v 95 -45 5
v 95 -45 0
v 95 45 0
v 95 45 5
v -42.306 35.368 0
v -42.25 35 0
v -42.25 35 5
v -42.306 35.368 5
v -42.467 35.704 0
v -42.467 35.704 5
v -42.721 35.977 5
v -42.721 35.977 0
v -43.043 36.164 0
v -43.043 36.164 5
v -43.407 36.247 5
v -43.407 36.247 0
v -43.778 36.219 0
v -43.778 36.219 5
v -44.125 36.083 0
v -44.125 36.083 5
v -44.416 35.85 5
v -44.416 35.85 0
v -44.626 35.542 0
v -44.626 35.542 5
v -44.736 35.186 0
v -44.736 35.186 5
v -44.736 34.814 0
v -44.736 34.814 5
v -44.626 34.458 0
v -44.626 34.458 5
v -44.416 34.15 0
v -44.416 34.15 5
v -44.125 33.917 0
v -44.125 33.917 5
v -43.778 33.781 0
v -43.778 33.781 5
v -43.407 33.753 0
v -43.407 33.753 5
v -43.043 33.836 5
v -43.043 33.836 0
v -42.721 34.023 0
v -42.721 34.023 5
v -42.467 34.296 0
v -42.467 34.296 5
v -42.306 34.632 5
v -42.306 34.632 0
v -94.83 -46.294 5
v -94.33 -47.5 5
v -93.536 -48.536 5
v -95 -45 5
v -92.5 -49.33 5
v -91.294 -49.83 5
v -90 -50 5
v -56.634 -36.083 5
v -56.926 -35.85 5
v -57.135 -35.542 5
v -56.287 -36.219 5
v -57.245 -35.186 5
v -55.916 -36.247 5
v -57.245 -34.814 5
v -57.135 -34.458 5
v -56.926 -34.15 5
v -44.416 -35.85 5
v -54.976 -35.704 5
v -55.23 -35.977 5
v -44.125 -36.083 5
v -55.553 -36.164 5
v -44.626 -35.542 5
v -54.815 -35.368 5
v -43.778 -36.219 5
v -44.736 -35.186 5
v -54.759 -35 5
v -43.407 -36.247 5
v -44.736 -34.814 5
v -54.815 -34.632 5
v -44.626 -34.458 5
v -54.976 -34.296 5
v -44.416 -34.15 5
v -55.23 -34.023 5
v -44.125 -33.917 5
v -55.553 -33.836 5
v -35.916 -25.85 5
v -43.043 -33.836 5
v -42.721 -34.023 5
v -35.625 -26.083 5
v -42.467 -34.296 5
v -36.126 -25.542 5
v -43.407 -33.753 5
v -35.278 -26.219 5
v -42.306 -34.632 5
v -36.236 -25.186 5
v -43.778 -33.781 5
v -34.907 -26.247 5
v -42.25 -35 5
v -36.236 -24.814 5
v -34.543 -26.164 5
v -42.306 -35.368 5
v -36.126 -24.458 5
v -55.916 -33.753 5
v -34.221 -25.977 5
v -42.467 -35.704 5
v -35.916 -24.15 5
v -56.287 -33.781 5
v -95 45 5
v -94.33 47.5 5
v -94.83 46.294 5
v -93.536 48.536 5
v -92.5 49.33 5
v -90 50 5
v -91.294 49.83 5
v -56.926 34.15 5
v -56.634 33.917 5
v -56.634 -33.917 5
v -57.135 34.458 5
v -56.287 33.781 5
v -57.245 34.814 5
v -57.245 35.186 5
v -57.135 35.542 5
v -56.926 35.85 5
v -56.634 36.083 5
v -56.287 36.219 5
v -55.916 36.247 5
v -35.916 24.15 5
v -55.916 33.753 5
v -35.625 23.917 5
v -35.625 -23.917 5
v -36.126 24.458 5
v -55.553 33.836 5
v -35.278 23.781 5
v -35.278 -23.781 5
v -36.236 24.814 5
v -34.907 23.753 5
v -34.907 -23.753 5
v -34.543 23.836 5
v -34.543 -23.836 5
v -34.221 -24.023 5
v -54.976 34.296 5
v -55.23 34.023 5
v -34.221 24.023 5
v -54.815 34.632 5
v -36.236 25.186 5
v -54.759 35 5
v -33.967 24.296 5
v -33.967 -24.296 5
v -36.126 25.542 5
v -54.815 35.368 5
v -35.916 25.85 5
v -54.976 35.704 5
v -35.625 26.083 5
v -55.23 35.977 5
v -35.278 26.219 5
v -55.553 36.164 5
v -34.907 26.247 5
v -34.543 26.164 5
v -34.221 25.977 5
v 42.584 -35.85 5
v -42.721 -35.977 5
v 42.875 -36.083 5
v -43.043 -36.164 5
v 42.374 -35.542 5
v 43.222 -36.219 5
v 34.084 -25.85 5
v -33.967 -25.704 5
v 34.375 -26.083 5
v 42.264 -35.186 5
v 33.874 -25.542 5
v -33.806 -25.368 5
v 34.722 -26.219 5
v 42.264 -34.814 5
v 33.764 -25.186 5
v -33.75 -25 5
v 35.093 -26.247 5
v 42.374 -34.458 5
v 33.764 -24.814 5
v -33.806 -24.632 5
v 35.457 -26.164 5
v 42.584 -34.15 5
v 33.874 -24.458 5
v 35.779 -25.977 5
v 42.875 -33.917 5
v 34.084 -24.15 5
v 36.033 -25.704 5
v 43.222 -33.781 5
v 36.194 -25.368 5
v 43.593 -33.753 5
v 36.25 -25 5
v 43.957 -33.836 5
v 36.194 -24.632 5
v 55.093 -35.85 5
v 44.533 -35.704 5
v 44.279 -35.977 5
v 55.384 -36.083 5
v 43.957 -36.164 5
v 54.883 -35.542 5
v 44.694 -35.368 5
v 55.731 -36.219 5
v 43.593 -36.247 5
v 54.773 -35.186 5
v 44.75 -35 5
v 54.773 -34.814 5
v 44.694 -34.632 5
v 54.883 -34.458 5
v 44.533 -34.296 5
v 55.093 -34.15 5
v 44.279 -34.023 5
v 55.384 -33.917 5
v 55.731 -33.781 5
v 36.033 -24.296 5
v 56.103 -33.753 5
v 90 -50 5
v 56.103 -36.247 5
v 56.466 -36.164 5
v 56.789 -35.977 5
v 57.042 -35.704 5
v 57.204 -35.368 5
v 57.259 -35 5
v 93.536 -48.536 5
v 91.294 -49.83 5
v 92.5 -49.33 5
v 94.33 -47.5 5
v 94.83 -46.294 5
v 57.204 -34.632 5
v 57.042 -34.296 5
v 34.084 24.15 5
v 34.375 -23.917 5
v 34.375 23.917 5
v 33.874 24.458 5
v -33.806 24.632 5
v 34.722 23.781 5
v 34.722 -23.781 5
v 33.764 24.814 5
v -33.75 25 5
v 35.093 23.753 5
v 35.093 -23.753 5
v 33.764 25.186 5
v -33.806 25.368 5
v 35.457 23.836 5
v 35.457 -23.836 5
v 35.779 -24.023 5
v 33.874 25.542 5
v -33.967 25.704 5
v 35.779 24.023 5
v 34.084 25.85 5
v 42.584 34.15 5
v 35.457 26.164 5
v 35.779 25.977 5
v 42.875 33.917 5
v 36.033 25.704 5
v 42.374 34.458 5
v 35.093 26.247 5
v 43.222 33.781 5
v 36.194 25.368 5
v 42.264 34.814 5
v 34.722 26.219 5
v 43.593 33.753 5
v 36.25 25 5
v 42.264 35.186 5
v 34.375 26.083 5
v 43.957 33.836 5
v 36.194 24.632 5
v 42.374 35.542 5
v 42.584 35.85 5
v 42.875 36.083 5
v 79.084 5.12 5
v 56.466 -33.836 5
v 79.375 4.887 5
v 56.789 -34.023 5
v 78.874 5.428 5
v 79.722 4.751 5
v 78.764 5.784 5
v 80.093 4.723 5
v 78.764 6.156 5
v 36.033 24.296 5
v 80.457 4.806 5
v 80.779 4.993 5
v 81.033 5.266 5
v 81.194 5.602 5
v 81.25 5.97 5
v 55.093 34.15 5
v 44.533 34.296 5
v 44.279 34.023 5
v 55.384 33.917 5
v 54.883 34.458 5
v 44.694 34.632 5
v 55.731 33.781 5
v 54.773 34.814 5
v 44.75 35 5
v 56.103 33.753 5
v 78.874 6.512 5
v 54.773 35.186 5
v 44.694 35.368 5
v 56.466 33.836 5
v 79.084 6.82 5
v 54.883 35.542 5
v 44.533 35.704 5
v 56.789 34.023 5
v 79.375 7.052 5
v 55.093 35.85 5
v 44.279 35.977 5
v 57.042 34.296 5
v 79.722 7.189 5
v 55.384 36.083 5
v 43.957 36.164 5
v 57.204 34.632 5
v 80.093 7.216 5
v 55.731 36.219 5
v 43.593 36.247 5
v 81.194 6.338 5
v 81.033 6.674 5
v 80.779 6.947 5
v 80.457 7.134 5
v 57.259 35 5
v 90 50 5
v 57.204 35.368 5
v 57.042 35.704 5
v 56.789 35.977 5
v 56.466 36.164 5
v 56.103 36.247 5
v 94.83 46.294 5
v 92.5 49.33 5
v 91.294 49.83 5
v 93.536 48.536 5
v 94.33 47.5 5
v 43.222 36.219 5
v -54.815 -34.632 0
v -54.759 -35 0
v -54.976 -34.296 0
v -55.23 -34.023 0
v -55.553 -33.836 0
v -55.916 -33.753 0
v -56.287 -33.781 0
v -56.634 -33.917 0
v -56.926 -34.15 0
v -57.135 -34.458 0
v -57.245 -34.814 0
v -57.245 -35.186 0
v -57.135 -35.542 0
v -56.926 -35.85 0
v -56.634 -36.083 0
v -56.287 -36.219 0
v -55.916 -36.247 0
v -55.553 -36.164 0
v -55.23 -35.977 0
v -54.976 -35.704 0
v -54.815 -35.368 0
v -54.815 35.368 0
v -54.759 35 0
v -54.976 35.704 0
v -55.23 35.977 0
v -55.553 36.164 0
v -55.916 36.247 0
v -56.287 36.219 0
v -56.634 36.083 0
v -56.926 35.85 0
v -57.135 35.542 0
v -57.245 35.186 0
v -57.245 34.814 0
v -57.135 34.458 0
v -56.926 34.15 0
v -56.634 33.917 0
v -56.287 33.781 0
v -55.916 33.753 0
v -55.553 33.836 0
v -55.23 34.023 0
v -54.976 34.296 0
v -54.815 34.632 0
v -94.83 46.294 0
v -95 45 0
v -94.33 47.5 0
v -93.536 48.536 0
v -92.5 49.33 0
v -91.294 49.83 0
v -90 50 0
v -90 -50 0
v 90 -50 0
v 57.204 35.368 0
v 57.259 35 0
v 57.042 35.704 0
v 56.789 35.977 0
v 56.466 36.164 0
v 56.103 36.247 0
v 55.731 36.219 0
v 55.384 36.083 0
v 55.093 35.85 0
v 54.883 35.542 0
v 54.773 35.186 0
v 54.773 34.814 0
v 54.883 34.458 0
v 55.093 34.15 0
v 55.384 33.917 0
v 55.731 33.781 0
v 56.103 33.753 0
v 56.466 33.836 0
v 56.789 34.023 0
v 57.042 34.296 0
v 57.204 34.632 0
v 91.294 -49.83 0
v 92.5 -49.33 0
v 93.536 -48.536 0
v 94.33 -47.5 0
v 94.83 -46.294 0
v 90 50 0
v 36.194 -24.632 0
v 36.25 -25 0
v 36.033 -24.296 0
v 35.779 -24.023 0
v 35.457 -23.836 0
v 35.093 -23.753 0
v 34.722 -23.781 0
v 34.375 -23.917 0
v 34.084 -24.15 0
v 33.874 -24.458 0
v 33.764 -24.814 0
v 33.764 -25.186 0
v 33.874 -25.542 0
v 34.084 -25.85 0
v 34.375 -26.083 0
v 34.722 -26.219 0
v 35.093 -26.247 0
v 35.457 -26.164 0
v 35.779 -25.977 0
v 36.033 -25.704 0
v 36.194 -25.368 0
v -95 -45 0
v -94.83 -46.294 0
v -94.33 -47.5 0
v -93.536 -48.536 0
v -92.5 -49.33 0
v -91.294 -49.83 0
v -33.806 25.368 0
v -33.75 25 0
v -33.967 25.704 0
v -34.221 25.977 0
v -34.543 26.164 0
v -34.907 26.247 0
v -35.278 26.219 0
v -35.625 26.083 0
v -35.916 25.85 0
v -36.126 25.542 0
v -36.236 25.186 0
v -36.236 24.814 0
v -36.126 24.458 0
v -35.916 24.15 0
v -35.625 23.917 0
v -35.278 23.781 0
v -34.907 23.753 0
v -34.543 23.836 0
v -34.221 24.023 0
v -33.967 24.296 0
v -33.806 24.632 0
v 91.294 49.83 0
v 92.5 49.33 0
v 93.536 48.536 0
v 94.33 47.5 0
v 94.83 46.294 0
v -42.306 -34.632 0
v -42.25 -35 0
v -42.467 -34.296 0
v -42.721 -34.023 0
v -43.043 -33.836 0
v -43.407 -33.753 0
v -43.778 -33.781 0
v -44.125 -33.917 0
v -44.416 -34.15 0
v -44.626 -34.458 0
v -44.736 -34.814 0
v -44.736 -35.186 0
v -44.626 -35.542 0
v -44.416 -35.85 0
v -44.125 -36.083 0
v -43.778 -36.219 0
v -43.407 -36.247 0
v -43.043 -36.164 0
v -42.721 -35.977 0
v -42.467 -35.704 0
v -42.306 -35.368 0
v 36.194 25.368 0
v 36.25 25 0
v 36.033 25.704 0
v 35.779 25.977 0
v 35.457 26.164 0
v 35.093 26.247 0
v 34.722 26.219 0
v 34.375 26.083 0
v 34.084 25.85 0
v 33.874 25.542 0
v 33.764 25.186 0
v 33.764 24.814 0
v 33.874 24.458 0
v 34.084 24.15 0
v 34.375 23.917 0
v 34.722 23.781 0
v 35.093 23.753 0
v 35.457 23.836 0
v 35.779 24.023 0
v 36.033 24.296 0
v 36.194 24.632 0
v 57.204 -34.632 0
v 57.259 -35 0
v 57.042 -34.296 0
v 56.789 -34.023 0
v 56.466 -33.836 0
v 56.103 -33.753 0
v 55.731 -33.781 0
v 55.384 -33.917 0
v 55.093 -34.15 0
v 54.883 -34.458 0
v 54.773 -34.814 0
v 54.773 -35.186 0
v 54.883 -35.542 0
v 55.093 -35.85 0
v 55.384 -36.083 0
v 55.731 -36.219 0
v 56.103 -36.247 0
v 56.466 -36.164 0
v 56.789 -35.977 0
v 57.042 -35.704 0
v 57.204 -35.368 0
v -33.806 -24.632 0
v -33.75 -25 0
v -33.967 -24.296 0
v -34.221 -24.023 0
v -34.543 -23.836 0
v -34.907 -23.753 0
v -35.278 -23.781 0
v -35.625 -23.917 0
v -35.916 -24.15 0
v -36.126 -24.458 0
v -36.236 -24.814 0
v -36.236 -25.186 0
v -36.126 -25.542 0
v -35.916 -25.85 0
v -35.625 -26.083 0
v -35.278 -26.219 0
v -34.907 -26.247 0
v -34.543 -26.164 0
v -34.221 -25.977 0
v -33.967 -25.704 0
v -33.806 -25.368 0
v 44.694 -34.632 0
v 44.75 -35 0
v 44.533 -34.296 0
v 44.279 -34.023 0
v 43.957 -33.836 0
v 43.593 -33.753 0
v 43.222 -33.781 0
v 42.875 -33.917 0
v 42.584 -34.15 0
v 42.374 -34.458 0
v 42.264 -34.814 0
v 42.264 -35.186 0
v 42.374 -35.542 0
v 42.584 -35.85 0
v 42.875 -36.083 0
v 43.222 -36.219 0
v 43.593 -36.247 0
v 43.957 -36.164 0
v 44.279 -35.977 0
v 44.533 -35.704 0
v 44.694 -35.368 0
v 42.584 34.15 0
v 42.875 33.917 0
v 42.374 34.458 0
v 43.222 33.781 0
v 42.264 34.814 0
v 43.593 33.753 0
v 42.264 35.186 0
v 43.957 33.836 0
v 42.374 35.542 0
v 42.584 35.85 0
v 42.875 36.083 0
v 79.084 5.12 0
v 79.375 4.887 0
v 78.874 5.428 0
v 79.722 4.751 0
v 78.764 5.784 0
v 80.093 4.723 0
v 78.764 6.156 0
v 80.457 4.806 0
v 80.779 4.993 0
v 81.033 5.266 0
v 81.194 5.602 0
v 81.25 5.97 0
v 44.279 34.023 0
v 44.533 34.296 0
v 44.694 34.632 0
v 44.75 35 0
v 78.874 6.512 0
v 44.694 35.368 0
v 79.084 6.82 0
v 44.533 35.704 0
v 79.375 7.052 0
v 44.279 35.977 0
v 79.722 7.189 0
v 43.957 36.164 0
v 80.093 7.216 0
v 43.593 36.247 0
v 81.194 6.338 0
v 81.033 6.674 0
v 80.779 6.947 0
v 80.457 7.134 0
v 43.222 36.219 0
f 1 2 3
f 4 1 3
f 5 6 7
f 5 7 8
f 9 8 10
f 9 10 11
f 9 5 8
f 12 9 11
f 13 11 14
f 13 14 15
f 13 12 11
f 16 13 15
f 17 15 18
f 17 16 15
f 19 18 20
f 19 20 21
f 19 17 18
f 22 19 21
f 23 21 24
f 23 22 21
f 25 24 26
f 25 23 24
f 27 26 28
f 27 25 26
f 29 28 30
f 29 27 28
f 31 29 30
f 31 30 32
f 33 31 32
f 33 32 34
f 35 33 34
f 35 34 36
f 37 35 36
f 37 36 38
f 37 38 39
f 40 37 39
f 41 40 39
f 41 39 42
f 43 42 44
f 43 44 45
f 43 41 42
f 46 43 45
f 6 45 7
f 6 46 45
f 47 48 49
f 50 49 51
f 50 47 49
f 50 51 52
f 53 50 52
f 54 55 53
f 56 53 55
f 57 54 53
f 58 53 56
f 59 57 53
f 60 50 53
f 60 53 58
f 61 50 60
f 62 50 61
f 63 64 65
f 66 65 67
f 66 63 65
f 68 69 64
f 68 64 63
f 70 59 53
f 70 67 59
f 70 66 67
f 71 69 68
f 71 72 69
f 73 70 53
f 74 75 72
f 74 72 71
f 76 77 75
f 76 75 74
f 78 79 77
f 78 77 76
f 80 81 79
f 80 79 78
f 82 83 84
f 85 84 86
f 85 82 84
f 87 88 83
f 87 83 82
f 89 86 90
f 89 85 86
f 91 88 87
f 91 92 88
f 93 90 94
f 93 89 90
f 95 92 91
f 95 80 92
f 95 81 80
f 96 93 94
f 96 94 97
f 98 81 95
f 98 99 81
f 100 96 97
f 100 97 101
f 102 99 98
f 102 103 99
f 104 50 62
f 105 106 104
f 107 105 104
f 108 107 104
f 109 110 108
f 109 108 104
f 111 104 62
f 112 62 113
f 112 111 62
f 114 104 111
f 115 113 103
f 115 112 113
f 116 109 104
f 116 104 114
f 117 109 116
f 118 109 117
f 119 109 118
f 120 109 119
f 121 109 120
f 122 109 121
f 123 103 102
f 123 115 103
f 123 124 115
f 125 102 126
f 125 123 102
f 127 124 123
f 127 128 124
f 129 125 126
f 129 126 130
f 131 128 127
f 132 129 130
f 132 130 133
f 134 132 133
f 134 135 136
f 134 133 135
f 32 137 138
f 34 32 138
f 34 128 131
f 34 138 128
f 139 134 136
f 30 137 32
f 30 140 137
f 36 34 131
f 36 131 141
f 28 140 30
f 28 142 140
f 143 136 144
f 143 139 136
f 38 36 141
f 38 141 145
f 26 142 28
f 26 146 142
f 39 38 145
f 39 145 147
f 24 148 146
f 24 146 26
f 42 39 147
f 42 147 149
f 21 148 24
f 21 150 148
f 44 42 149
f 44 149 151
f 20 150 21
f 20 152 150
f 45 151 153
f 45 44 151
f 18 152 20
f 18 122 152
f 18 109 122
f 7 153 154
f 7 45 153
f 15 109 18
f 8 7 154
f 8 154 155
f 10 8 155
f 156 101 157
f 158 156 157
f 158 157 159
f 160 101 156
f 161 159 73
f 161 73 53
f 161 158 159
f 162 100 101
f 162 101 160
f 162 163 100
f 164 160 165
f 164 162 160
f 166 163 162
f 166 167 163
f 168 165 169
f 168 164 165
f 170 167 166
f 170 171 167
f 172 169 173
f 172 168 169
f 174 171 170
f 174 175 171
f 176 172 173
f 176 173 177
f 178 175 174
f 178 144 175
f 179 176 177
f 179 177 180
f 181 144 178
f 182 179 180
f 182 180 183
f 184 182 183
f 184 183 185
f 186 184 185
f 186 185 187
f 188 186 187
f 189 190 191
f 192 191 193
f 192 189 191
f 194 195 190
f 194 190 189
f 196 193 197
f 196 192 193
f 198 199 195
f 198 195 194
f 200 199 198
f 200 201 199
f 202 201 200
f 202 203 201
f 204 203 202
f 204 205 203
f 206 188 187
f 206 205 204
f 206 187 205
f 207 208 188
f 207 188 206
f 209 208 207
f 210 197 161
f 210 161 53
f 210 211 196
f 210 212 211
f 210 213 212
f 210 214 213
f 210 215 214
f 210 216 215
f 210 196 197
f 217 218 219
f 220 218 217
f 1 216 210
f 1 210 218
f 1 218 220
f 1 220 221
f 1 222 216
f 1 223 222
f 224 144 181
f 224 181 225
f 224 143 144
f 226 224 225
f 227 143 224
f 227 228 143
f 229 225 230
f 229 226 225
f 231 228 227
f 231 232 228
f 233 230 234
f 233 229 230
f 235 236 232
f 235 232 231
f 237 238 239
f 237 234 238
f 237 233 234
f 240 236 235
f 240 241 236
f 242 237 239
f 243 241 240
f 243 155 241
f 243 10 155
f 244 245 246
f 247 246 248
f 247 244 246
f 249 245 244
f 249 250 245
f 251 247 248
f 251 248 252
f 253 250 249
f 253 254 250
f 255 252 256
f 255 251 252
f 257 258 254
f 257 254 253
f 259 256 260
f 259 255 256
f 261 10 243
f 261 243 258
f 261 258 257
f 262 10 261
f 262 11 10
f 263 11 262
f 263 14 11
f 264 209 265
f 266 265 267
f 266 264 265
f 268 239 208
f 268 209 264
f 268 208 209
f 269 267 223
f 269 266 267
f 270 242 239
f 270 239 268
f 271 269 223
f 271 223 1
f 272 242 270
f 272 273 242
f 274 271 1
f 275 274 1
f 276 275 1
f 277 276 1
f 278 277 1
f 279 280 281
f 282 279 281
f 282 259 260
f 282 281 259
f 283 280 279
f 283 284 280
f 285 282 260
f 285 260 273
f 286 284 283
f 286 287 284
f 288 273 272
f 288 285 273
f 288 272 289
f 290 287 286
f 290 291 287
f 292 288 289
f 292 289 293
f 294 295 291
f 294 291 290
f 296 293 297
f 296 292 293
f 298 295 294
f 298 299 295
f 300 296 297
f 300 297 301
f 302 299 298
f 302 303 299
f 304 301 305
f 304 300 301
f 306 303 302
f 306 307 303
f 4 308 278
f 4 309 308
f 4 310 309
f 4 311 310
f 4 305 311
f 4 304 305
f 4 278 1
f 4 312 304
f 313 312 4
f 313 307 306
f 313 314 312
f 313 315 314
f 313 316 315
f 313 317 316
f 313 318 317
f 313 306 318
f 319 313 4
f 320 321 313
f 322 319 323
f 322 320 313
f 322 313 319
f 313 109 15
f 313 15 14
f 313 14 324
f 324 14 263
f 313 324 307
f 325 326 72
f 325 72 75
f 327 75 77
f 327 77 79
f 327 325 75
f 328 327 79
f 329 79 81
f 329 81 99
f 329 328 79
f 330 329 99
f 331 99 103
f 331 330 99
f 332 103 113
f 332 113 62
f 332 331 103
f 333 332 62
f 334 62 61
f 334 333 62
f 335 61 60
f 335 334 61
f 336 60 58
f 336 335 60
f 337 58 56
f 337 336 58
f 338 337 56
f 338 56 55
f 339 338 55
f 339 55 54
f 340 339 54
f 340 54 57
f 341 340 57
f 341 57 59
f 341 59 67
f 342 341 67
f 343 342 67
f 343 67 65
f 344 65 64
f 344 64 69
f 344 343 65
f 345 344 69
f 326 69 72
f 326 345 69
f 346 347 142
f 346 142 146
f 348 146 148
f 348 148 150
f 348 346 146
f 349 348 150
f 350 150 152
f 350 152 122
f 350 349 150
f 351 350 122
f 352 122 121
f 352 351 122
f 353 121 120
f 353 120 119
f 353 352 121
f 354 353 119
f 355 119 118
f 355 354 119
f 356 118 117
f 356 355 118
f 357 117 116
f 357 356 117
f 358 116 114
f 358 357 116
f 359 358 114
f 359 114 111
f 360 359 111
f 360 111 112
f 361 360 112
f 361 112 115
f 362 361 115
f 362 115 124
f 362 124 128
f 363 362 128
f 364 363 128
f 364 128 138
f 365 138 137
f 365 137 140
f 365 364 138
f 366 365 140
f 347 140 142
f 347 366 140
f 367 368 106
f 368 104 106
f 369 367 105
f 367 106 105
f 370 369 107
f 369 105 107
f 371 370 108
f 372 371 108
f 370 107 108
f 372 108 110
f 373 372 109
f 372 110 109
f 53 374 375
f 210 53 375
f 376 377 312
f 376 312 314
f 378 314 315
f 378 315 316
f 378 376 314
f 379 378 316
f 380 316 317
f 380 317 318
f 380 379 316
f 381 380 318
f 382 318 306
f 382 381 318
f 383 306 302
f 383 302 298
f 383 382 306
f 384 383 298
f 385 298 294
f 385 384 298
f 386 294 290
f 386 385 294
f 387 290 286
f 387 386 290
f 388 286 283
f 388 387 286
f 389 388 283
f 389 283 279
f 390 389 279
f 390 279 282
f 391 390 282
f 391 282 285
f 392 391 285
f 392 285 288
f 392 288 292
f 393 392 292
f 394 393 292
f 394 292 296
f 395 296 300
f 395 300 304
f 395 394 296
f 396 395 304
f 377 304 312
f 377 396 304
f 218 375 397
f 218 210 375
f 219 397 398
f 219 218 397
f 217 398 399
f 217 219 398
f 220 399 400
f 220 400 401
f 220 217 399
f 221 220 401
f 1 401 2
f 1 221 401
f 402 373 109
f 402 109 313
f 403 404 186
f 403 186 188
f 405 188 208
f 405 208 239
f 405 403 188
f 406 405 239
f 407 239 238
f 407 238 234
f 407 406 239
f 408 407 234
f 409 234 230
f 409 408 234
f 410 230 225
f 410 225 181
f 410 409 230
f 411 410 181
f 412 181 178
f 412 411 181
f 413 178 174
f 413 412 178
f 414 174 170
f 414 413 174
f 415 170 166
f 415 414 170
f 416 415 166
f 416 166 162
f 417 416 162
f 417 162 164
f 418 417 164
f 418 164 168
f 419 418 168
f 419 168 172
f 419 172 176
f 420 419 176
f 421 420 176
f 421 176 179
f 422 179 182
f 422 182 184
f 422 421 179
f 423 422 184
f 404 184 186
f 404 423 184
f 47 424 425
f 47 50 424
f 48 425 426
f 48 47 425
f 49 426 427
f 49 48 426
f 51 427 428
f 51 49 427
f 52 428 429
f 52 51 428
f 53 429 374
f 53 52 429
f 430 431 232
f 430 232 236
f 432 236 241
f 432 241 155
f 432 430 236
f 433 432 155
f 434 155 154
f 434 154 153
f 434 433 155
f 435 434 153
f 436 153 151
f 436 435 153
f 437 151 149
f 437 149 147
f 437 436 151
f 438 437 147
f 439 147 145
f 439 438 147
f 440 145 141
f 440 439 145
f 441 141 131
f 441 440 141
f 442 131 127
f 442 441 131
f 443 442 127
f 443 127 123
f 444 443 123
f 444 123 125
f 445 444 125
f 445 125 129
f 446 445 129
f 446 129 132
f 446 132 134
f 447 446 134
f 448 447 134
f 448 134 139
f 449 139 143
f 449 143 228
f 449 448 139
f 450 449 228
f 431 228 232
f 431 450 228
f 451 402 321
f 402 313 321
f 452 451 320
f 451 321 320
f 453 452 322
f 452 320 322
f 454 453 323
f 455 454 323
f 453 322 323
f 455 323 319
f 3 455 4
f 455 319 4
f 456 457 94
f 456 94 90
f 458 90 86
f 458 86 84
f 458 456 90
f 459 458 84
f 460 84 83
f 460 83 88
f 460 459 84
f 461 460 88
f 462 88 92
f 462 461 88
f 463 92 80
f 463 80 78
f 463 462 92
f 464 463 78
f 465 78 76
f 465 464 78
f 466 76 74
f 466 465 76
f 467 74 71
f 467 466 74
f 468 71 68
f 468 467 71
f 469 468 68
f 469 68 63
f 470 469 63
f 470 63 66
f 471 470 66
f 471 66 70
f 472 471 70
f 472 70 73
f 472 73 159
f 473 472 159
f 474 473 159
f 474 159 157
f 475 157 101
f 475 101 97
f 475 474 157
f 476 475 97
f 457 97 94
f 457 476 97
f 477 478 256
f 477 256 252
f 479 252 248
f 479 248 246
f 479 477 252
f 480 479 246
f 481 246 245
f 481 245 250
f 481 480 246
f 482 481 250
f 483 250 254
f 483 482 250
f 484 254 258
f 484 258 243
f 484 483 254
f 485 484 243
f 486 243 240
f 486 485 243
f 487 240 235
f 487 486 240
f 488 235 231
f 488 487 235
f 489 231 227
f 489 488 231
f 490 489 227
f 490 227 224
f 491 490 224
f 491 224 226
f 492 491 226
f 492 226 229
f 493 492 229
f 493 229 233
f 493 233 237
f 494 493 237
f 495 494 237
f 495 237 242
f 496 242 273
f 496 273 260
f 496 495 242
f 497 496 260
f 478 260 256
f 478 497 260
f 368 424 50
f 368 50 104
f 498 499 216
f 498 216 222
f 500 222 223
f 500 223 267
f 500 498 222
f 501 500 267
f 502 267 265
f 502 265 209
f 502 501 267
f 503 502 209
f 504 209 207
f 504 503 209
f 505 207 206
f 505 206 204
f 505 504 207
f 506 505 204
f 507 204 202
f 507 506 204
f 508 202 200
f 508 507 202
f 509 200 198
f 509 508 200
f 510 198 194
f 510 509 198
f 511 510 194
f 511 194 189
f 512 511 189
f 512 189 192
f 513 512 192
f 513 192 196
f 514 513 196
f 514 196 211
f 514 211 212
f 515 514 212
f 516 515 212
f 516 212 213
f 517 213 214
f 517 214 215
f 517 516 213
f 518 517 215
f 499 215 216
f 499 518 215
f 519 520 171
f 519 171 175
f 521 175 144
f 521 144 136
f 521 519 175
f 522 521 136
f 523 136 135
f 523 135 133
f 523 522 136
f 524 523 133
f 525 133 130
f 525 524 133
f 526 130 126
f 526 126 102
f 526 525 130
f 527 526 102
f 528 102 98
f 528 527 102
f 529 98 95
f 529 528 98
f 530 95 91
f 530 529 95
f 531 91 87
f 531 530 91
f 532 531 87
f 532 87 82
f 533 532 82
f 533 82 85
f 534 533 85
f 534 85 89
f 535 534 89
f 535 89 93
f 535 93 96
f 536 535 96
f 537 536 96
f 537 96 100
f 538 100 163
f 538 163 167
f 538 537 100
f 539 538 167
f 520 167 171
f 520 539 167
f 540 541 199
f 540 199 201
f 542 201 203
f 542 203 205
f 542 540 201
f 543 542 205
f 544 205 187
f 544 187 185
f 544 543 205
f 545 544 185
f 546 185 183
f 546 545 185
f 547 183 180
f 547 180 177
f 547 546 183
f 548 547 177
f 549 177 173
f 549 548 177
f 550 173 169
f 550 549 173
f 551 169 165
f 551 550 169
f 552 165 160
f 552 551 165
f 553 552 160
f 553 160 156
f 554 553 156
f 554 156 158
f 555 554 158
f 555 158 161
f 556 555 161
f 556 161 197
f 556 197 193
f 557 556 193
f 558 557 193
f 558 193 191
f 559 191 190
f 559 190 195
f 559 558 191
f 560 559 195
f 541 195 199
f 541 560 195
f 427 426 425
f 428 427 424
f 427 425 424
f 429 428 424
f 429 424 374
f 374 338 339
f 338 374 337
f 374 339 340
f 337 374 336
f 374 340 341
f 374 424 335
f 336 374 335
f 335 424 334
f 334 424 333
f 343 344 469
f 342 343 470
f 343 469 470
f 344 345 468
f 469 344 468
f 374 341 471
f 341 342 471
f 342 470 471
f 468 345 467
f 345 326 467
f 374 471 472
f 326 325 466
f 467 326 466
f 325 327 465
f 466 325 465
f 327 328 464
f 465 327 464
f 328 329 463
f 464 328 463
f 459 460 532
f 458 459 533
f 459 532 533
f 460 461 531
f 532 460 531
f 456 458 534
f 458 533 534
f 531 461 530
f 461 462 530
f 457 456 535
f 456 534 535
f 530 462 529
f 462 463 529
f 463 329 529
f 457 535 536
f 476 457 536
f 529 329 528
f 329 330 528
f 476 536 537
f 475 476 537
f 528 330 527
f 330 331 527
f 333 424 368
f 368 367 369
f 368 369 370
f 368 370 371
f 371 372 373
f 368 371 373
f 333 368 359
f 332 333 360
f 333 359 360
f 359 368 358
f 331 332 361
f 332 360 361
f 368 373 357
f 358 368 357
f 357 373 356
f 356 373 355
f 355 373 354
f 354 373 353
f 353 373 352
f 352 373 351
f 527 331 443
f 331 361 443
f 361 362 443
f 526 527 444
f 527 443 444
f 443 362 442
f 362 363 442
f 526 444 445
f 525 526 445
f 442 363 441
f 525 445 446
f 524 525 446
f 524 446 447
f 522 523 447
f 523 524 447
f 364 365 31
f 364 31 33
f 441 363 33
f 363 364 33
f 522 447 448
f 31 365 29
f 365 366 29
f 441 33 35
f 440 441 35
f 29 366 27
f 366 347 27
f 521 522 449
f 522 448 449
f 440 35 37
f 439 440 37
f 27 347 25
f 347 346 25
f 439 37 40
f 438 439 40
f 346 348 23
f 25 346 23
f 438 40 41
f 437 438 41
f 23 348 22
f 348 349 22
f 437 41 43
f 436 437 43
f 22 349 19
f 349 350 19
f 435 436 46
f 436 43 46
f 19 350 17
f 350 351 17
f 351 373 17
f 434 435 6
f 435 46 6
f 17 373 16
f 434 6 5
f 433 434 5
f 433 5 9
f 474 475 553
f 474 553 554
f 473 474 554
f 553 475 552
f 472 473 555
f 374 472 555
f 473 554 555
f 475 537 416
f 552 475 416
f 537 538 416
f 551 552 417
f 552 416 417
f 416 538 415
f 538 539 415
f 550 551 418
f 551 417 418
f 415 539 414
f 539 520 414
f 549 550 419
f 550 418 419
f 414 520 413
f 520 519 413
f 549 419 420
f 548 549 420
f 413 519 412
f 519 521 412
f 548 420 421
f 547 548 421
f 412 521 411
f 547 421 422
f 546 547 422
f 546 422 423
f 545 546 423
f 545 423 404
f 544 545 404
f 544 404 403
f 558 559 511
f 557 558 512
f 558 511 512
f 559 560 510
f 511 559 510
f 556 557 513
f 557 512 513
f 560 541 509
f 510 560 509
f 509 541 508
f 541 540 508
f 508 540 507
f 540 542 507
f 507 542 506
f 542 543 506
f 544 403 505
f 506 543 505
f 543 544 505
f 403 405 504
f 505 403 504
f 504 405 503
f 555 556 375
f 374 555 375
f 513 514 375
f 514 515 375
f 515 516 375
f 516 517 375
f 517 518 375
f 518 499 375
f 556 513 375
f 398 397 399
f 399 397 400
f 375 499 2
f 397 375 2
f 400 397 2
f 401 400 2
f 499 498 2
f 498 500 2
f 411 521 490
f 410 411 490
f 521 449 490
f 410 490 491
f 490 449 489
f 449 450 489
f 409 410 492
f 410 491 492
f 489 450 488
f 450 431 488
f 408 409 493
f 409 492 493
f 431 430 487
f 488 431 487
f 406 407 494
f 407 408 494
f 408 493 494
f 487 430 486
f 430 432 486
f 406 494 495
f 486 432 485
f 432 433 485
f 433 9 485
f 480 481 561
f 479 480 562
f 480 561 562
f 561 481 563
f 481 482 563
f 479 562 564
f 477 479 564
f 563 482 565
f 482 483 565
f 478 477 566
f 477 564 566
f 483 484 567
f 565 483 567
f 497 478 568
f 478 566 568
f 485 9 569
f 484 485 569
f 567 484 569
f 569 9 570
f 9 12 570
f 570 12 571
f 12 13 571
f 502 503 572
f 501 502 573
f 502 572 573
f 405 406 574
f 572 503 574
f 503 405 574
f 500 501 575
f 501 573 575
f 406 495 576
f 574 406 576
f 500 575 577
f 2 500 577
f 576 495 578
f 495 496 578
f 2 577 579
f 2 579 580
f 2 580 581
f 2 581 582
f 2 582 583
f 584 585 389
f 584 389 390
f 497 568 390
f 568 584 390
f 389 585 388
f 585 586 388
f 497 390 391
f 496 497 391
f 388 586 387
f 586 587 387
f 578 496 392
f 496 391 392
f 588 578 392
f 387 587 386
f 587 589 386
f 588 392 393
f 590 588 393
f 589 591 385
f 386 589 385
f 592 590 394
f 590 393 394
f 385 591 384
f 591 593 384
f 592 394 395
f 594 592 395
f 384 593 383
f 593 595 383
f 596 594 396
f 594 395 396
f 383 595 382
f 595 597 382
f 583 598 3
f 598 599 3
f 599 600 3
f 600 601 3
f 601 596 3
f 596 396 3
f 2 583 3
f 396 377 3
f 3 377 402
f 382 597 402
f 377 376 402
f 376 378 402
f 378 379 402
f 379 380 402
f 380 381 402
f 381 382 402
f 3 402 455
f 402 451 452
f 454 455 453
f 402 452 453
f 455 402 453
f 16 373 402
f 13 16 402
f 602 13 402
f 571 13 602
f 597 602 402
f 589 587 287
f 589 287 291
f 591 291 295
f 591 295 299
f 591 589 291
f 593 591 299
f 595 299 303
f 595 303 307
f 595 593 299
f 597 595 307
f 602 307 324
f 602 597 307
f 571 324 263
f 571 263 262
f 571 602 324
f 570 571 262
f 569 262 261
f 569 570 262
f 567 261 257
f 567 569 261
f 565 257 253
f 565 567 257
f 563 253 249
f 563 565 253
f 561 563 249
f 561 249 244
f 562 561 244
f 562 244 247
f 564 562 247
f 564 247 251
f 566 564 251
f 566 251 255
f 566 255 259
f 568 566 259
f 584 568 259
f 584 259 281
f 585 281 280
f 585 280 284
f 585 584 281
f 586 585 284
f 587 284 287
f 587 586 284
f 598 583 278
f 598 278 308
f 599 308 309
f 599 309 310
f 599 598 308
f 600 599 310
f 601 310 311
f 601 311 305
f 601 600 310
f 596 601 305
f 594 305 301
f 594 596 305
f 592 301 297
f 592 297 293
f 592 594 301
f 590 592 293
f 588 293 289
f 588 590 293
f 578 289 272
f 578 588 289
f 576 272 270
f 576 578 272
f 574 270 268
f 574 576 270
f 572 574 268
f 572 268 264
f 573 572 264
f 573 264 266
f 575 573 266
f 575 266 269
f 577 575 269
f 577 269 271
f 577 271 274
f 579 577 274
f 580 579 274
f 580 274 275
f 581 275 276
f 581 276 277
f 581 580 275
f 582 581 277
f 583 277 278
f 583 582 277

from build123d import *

# Parameters (mm, degrees)
SKETCH1_W           = 190
SKETCH1_H           = 100
SKETCH1_R           = 1.25
BOSS_EXTRUDE2_DEPTH = 5
FILLET1_R           = 5


with BuildPart() as part:
    # Sketch1 → Boss-Extrude2 (new body)
    with BuildSketch(Plane.XY):
        Rectangle(SKETCH1_W, SKETCH1_H)
        with Locations((-35, 25)):
            Circle(SKETCH1_R, mode=Mode.SUBTRACT)
        with Locations((35, -25)):
            Circle(SKETCH1_R, mode=Mode.SUBTRACT)
        with Locations((-35, -25)):
            Circle(SKETCH1_R, mode=Mode.SUBTRACT)
        with Locations((35, 25)):
            Circle(SKETCH1_R, mode=Mode.SUBTRACT)
        with Locations((80, 5.969945355)):
            Circle(SKETCH1_R, mode=Mode.SUBTRACT)
        with Locations((-43.5, -35)):
            Circle(SKETCH1_R, mode=Mode.SUBTRACT)
        with Locations((-56.009274653, -35)):
            Circle(SKETCH1_R, mode=Mode.SUBTRACT)
        with Locations((-56.009274653, 35)):
            Circle(SKETCH1_R, mode=Mode.SUBTRACT)
        with Locations((-43.5, 35)):
            Circle(SKETCH1_R, mode=Mode.SUBTRACT)
        with Locations((43.5, -35)):
            Circle(SKETCH1_R, mode=Mode.SUBTRACT)
        with Locations((56.009274653, -35)):
            Circle(SKETCH1_R, mode=Mode.SUBTRACT)
        with Locations((43.5, 35)):
            Circle(SKETCH1_R, mode=Mode.SUBTRACT)
        with Locations((56.009274653, 35)):
            Circle(SKETCH1_R, mode=Mode.SUBTRACT)
    extrude(amount=BOSS_EXTRUDE2_DEPTH)

    # Fillet1
    fillet1_edges = [part.edges().sort_by_distance(p)[0] for p in [
        (95, 50, 2.5),
        (95, -50, 2.5),
        (-95, -50, 2.5),
        (-95, 50, 2.5),
    ]]
    fillet(fillet1_edges, radius=FILLET1_R)


solid = part.part
